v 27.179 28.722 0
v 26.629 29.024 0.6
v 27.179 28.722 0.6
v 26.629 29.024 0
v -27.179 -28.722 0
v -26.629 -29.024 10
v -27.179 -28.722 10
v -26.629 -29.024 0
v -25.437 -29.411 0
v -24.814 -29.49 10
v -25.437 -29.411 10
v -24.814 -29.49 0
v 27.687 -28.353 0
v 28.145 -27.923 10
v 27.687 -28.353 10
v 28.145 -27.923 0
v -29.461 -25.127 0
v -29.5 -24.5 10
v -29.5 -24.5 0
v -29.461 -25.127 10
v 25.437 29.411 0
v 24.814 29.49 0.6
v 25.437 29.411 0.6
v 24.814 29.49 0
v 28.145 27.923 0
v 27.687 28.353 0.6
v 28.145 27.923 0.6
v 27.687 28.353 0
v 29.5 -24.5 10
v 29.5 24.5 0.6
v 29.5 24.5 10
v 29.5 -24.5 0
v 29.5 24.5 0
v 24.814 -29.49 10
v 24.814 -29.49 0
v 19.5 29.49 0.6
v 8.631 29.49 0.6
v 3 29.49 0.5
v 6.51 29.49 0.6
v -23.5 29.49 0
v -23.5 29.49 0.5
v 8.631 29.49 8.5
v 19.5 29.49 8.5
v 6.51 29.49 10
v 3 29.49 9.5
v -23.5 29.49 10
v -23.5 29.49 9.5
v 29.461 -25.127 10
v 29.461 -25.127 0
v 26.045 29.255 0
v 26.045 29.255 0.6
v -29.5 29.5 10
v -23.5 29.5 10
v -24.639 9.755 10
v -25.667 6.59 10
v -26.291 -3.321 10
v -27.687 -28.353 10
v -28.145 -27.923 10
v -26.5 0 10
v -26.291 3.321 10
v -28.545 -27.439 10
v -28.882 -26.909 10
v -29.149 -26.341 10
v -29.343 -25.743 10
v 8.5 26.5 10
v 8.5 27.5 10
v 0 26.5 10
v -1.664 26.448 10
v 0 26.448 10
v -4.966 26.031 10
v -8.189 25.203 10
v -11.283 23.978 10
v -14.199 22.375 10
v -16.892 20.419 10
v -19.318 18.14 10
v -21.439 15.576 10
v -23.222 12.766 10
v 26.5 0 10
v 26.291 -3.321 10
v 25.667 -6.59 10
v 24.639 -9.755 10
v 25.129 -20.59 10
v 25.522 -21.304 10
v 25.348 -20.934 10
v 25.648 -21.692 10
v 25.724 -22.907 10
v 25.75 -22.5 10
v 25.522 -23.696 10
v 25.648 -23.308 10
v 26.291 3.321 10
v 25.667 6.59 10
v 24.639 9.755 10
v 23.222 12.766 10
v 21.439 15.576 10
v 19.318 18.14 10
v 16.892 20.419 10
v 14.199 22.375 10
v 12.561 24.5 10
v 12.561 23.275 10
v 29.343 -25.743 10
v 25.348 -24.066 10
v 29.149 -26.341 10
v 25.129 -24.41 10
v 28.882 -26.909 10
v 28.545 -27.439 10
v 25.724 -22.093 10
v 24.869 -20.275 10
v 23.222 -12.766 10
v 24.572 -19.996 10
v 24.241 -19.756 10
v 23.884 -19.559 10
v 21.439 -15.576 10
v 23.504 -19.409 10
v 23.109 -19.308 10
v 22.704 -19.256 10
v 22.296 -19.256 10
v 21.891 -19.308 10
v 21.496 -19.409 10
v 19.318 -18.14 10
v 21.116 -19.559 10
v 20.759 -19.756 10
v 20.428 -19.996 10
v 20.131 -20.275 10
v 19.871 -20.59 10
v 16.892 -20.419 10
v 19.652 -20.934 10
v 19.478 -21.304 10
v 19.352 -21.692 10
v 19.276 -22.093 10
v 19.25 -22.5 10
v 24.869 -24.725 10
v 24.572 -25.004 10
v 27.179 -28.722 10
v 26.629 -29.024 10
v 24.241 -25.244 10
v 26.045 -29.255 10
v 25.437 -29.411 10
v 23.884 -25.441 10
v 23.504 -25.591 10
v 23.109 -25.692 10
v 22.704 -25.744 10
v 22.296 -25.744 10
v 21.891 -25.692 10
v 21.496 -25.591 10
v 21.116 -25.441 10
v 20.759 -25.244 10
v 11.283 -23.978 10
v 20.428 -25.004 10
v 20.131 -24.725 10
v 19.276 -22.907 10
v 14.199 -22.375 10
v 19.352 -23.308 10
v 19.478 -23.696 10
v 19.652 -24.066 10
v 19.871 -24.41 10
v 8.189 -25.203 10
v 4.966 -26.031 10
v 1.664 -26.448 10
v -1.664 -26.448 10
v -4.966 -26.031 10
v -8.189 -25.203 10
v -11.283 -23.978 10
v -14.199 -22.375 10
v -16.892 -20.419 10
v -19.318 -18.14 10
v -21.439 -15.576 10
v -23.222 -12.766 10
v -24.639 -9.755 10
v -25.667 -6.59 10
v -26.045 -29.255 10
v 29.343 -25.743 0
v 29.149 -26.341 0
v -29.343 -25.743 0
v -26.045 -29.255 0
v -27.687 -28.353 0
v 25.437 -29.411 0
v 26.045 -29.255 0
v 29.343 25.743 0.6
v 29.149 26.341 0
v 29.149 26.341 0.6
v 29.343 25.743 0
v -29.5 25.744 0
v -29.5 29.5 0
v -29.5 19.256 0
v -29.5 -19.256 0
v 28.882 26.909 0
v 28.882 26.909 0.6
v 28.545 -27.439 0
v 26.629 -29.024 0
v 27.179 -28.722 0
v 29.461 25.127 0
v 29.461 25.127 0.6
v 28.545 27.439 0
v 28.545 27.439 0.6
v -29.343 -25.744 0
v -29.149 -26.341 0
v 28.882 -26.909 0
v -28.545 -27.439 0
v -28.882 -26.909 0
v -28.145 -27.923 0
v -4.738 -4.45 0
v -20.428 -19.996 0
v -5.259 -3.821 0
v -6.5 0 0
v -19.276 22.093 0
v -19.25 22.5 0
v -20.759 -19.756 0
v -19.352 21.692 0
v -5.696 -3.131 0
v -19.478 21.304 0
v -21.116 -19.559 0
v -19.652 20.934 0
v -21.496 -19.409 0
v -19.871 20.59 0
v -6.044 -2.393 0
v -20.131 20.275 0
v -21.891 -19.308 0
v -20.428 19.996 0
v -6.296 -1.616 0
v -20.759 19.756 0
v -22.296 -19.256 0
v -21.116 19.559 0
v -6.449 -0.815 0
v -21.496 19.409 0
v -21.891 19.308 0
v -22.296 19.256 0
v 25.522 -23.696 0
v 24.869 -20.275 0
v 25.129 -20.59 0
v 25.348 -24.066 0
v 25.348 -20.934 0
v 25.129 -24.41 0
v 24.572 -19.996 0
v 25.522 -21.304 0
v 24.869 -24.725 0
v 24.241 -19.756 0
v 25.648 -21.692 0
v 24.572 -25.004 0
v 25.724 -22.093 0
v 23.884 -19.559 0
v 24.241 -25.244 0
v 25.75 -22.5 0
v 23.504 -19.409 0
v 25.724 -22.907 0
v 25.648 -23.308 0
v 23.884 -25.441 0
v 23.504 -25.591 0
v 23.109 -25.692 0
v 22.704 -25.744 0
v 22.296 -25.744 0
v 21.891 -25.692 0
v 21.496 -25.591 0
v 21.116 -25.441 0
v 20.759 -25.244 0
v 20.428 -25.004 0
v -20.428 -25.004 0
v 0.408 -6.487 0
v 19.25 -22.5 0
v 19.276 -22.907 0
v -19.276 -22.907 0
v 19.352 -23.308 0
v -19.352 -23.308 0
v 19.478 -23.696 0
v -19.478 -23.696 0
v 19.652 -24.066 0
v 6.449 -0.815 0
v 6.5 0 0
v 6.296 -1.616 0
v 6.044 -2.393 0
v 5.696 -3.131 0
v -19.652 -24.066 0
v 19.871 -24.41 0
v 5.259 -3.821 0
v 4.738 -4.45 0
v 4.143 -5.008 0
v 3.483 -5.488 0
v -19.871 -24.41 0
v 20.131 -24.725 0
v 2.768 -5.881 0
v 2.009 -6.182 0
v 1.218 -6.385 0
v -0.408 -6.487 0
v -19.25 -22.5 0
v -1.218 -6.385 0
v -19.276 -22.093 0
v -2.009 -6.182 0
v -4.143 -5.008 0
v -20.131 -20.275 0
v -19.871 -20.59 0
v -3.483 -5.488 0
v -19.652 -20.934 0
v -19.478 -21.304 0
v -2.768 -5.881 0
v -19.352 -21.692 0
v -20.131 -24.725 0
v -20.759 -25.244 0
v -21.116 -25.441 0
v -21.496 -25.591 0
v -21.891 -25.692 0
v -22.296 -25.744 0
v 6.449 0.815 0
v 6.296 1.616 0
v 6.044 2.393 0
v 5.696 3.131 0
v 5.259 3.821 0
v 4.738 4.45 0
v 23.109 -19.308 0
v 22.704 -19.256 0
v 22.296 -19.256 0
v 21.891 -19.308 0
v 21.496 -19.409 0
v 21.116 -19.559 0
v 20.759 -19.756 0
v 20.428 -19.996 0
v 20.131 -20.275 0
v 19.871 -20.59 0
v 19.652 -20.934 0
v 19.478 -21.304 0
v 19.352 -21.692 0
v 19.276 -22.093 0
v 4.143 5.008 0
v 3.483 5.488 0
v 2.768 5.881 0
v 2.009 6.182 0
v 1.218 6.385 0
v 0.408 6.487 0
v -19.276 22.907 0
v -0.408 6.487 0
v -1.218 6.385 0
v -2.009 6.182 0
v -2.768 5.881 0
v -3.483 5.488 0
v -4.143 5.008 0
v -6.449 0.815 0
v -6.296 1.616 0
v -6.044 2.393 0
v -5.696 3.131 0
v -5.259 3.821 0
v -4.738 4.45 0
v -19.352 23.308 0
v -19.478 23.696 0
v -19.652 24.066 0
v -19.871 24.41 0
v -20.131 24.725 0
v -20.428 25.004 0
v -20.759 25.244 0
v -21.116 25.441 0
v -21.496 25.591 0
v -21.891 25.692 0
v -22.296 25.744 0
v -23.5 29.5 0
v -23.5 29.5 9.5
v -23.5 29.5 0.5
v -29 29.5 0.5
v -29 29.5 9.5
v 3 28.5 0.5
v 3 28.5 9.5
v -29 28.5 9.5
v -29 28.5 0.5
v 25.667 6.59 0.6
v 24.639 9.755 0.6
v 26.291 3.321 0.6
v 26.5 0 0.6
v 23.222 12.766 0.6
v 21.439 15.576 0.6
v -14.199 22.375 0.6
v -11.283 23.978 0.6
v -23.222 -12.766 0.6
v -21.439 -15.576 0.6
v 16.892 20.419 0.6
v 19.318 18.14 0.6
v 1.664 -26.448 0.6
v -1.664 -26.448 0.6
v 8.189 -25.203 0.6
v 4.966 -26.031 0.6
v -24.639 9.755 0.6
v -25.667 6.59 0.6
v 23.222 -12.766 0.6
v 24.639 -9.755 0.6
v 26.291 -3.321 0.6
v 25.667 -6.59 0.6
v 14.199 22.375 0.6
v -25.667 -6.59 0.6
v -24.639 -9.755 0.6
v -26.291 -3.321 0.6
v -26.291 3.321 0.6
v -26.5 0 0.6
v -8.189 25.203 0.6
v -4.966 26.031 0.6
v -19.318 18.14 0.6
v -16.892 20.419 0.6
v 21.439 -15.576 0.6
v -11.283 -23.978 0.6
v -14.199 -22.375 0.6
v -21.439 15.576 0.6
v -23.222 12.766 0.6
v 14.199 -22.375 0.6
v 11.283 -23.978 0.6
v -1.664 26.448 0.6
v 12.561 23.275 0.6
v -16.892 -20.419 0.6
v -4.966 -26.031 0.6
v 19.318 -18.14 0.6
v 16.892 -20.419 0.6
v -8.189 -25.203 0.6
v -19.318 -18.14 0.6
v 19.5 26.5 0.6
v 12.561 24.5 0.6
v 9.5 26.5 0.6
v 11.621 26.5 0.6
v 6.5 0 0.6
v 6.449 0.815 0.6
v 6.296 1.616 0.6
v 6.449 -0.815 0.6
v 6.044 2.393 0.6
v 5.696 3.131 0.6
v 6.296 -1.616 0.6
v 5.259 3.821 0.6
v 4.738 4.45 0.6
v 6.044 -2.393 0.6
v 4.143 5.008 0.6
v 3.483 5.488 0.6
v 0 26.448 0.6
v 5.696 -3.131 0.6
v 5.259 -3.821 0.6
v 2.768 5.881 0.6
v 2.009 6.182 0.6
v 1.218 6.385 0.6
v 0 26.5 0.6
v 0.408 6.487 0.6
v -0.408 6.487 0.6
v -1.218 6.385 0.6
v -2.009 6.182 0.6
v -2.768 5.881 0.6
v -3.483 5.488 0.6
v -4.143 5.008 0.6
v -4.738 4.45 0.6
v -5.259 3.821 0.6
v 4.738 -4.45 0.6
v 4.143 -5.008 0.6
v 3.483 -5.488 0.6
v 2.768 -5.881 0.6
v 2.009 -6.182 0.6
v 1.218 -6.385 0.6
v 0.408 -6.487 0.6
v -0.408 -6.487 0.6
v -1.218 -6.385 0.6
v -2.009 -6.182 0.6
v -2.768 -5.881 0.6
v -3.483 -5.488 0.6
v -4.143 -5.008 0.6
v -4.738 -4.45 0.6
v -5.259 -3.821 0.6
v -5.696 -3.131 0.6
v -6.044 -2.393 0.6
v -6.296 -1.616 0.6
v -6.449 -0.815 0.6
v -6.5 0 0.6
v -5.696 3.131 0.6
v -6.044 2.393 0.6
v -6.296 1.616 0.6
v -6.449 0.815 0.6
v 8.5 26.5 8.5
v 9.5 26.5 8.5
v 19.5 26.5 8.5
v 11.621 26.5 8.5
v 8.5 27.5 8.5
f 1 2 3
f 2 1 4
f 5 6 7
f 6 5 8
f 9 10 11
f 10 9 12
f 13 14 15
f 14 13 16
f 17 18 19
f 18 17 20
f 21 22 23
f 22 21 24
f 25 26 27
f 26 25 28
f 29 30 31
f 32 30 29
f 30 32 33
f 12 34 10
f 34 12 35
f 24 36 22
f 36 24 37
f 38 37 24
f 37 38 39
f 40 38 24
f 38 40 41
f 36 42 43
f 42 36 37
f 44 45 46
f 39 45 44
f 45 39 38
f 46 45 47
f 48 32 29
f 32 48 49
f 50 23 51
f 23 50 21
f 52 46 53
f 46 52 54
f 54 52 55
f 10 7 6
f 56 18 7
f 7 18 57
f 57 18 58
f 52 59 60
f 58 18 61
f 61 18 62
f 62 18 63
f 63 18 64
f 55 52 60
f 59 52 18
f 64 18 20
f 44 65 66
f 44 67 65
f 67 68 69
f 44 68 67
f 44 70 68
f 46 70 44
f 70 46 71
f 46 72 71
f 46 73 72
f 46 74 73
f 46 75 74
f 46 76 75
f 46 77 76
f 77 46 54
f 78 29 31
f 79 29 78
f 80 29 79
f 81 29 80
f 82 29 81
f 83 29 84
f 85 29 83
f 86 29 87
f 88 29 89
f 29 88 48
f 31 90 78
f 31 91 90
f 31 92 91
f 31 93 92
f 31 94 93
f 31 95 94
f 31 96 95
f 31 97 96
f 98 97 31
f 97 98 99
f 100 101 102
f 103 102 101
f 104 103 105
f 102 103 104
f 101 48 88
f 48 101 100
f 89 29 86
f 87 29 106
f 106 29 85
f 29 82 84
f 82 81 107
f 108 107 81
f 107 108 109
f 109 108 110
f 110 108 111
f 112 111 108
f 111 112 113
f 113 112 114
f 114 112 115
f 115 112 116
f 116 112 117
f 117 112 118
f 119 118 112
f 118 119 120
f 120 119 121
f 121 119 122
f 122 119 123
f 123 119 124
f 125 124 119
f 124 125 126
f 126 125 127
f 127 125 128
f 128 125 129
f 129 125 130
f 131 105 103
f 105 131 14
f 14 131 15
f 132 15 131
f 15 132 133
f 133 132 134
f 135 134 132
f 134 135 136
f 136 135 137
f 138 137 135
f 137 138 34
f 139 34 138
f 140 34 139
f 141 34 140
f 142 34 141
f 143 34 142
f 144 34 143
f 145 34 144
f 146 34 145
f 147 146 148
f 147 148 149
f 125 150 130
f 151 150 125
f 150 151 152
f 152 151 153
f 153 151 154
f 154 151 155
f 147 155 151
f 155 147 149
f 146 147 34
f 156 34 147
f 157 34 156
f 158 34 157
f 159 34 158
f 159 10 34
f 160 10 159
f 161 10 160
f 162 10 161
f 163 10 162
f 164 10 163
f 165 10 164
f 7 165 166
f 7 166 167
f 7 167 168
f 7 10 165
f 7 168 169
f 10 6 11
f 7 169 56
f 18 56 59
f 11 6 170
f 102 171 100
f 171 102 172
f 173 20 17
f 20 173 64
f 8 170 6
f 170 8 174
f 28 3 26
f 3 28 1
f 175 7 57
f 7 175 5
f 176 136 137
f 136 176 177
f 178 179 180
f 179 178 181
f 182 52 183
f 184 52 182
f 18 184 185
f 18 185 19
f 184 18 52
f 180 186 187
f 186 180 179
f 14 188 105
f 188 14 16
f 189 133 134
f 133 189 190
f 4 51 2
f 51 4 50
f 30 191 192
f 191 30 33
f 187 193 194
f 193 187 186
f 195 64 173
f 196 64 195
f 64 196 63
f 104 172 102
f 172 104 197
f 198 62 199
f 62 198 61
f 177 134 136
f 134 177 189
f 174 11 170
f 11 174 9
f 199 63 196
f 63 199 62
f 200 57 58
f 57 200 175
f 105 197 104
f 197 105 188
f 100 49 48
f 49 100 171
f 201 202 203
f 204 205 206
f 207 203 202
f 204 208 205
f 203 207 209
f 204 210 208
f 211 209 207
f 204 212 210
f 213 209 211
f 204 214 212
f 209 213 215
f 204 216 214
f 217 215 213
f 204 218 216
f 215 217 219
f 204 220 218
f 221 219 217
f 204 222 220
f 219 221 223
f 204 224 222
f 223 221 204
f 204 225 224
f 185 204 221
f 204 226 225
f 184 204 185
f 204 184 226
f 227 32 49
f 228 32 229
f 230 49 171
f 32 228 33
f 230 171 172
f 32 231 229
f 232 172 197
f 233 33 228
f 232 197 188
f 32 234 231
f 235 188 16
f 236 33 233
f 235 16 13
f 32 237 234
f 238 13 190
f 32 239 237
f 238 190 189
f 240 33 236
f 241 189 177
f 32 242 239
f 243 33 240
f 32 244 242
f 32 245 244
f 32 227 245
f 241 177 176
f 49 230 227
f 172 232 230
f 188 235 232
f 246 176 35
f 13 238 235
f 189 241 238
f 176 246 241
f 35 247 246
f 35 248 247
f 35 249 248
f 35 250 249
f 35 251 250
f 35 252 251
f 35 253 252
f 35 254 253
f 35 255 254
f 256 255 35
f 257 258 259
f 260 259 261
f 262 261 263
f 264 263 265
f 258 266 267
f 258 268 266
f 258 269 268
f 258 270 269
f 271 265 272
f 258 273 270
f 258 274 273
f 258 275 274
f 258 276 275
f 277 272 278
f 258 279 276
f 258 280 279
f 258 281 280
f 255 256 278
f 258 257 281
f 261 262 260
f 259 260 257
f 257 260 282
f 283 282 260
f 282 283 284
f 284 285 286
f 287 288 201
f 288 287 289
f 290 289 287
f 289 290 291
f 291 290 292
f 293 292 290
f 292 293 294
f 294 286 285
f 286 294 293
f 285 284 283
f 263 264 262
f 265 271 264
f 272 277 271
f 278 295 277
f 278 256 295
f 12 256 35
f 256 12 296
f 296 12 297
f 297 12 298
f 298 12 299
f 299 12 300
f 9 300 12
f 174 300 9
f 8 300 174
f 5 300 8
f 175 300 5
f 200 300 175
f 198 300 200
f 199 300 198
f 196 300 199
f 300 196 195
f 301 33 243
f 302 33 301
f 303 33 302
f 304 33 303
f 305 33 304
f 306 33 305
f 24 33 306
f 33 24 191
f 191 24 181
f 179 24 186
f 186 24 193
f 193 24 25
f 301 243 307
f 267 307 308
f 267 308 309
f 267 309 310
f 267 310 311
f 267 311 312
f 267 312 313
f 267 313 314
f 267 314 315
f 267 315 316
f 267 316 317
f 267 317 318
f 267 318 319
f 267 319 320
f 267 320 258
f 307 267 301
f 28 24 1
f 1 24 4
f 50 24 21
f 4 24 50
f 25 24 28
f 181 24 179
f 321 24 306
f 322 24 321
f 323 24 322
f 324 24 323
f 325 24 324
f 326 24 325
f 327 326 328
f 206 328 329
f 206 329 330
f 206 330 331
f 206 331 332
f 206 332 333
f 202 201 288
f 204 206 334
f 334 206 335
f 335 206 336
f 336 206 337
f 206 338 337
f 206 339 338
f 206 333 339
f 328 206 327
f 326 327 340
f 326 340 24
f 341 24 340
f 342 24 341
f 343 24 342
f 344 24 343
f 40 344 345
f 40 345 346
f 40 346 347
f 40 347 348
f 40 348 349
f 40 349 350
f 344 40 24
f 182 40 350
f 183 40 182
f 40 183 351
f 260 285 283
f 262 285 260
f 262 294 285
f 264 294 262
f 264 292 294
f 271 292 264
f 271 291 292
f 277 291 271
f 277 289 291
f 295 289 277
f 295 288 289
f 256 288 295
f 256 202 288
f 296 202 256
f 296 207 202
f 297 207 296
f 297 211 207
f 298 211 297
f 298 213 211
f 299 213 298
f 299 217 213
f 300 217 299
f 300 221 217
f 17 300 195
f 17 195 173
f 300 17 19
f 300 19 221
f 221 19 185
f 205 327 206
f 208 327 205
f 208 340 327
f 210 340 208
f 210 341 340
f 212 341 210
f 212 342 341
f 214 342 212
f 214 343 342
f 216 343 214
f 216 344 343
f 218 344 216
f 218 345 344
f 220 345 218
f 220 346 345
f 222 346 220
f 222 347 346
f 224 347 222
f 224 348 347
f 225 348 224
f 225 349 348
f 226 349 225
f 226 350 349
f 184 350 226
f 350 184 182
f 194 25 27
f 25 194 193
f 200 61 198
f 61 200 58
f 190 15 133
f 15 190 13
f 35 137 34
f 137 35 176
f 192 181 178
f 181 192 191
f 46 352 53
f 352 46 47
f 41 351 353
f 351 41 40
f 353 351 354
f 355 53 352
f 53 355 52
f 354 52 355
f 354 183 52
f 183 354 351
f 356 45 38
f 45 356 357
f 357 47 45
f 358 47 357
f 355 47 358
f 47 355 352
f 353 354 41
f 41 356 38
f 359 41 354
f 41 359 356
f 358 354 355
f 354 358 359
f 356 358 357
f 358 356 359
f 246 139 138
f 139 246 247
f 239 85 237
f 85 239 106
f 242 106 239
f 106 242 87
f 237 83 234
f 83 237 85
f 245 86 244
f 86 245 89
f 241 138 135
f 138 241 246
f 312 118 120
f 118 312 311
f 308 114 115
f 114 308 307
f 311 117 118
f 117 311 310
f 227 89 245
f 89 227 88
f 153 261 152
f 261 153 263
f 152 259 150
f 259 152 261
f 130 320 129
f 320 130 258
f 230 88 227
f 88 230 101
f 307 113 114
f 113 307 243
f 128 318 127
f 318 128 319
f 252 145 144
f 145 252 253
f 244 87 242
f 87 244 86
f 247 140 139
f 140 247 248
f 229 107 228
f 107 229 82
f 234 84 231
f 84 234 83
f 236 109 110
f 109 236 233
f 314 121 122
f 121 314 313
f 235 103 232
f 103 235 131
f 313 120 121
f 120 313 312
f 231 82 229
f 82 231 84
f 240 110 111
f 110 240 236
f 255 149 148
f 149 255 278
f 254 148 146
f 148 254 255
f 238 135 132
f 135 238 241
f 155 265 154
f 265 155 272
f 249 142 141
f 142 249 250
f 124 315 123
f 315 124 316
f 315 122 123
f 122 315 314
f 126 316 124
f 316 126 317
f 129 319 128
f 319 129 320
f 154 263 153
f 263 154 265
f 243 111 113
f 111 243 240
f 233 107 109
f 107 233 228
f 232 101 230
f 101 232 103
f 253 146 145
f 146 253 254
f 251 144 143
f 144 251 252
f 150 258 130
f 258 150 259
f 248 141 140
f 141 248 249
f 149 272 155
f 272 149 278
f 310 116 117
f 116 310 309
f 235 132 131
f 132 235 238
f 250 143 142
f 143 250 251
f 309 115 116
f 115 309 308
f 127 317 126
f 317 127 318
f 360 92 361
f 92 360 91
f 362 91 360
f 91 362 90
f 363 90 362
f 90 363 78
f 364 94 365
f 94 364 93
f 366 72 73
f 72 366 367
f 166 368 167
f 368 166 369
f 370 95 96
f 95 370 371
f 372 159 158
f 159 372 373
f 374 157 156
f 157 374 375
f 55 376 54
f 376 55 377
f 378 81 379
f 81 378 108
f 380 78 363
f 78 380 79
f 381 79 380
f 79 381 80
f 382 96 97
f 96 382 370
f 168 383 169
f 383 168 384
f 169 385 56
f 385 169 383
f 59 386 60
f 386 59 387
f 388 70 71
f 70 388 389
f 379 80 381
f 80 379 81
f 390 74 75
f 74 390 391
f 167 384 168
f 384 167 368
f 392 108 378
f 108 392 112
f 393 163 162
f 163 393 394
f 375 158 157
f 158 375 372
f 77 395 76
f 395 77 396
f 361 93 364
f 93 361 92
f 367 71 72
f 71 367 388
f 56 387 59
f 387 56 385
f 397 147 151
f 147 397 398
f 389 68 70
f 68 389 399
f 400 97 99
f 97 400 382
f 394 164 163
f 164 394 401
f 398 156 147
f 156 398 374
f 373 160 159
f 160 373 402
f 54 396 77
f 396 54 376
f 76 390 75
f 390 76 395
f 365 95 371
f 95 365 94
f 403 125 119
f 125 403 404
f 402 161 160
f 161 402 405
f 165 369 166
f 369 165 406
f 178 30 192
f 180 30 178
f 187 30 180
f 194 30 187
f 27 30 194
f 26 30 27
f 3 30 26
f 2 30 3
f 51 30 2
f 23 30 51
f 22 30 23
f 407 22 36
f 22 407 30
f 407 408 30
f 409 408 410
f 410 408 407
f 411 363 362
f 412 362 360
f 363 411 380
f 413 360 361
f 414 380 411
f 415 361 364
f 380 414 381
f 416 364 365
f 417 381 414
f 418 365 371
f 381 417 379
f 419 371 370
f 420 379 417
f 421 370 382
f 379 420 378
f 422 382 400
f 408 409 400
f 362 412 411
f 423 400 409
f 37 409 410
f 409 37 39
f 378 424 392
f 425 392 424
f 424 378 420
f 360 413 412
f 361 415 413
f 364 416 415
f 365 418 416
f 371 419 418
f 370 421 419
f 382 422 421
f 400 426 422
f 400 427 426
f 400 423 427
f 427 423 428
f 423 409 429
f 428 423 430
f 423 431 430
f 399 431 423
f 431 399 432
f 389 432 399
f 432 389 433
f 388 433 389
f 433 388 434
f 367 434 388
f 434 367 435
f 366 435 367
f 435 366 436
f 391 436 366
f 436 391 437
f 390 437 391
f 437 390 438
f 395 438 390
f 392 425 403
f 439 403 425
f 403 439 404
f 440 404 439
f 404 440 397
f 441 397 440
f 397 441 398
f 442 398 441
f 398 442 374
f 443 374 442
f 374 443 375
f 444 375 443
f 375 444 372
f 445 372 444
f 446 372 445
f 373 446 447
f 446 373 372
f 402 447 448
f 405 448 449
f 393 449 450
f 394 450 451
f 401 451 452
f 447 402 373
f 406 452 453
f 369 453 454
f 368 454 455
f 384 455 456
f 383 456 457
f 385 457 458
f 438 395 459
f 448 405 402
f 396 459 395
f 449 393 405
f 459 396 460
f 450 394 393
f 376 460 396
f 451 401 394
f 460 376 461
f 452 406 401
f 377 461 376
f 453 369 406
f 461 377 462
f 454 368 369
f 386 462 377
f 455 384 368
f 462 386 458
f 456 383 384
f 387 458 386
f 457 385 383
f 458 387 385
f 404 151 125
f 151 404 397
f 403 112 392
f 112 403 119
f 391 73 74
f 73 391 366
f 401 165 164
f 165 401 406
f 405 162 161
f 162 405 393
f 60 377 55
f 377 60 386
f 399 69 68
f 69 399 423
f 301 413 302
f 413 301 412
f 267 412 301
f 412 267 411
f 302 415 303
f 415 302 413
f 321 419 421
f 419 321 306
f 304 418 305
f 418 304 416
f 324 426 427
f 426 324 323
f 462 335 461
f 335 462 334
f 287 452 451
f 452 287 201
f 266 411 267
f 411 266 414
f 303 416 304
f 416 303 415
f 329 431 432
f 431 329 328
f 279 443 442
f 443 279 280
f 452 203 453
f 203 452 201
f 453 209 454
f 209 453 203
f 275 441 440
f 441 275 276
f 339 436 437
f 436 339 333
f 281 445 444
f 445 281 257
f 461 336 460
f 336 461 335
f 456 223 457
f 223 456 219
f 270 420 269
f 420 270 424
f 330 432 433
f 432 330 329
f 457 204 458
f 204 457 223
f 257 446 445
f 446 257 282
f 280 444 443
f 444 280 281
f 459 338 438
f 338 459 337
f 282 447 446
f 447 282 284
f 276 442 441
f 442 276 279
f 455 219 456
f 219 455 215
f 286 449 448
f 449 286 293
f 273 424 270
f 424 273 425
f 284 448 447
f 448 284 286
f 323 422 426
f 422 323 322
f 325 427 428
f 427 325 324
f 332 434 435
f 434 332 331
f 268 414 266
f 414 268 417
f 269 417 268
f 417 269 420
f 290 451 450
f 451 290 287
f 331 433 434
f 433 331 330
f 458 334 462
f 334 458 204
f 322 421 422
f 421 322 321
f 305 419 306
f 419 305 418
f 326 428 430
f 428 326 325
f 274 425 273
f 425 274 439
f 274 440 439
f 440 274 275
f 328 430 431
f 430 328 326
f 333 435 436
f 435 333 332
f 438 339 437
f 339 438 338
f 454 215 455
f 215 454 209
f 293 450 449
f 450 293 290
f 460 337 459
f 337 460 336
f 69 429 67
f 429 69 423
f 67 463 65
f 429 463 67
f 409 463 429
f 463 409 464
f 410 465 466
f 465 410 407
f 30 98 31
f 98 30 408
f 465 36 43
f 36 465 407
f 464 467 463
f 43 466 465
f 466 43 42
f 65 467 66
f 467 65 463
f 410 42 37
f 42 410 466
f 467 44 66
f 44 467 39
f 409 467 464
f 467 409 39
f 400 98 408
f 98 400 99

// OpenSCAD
$fn = 50;


difference() {
	union() {
		hull() {
			translate(v = [-24.5000000000, 24.5000000000, 0]) {
				cylinder(h = 10, r = 5);
			}
			translate(v = [24.5000000000, 24.5000000000, 0]) {
				cylinder(h = 10, r = 5);
			}
			translate(v = [-24.5000000000, -24.5000000000, 0]) {
				cylinder(h = 10, r = 5);
			}
			translate(v = [24.5000000000, -24.5000000000, 0]) {
				cylinder(h = 10, r = 5);
			}
		}
		translate(v = [-29.5000000000, 23.5000000000, 0]) {
			cube(size = [6, 6, 10]);
		}
	}
	union() {
		translate(v = [-30.0000000000, -22.5000000000, -250.0000000000]) {
			rotate(a = [0, 0, 0]) {
				difference() {
					union() {
						hull() {
							translate(v = [7.5000000000, 0, 0]) {
								cylinder(h = 250, r = 3.2500000000, r1 = 3.2500000000, r2 = 3.2500000000);
							}
							translate(v = [-7.5000000000, 0, 0]) {
								cylinder(h = 250, r = 3.2500000000, r1 = 3.2500000000, r2 = 3.2500000000);
							}
						}
					}
					union();
				}
			}
		}
		translate(v = [-30.0000000000, 22.5000000000, -250.0000000000]) {
			rotate(a = [0, 0, 0]) {
				difference() {
					union() {
						hull() {
							translate(v = [7.5000000000, 0, 0]) {
								cylinder(h = 250, r = 3.2500000000, r1 = 3.2500000000, r2 = 3.2500000000);
							}
							translate(v = [-7.5000000000, 0, 0]) {
								cylinder(h = 250, r = 3.2500000000, r1 = 3.2500000000, r2 = 3.2500000000);
							}
						}
					}
					union();
				}
			}
		}
		translate(v = [-29.0000000000, 28.5000000000, 0.5000000000]) {
			cube(size = [32, 1, 9.0000000000]);
		}
		translate(v = [22.5000000000, -22.5000000000, -50.0000000000]) {
			cylinder(h = 100, r = 3.2500000000);
		}
		translate(v = [0, 0, 0.6000000000]) {
			cylinder(h = 12.4000000000, r = 26.5000000000);
		}
		translate(v = [0, 0, -5.0000000000]) {
			cylinder(h = 10, r = 6.5000000000);
		}
		translate(v = [0.0000000000, 24.5000000000, 0.6000000000]) {
			cube(size = [29.5000000000, 2, 12.4000000000]);
		}
		translate(v = [19.5000000000, 24.5000000000, 0.6000000000]) {
			cube(size = [10, 5, 12.4000000000]);
		}
		translate(v = [8.5000000000, 24.5000000000, 8.5000000000]) {
			cube(size = [21, 5, 1.5000000000]);
		}
		translate(v = [5.7500000000, 30.2500000000, 0.6000000000]) {
			rotate(a = [0, 0, -45]) {
				cube(size = [7.5000000000, 1.5000000000, 12.4000000000]);
			}
		}
		translate(v = [5.0610000000, 22.5000000000, 0.6000000000]) {
			cube(size = [7.5000000000, 2, 9.4000000000]);
		}
	}
}
